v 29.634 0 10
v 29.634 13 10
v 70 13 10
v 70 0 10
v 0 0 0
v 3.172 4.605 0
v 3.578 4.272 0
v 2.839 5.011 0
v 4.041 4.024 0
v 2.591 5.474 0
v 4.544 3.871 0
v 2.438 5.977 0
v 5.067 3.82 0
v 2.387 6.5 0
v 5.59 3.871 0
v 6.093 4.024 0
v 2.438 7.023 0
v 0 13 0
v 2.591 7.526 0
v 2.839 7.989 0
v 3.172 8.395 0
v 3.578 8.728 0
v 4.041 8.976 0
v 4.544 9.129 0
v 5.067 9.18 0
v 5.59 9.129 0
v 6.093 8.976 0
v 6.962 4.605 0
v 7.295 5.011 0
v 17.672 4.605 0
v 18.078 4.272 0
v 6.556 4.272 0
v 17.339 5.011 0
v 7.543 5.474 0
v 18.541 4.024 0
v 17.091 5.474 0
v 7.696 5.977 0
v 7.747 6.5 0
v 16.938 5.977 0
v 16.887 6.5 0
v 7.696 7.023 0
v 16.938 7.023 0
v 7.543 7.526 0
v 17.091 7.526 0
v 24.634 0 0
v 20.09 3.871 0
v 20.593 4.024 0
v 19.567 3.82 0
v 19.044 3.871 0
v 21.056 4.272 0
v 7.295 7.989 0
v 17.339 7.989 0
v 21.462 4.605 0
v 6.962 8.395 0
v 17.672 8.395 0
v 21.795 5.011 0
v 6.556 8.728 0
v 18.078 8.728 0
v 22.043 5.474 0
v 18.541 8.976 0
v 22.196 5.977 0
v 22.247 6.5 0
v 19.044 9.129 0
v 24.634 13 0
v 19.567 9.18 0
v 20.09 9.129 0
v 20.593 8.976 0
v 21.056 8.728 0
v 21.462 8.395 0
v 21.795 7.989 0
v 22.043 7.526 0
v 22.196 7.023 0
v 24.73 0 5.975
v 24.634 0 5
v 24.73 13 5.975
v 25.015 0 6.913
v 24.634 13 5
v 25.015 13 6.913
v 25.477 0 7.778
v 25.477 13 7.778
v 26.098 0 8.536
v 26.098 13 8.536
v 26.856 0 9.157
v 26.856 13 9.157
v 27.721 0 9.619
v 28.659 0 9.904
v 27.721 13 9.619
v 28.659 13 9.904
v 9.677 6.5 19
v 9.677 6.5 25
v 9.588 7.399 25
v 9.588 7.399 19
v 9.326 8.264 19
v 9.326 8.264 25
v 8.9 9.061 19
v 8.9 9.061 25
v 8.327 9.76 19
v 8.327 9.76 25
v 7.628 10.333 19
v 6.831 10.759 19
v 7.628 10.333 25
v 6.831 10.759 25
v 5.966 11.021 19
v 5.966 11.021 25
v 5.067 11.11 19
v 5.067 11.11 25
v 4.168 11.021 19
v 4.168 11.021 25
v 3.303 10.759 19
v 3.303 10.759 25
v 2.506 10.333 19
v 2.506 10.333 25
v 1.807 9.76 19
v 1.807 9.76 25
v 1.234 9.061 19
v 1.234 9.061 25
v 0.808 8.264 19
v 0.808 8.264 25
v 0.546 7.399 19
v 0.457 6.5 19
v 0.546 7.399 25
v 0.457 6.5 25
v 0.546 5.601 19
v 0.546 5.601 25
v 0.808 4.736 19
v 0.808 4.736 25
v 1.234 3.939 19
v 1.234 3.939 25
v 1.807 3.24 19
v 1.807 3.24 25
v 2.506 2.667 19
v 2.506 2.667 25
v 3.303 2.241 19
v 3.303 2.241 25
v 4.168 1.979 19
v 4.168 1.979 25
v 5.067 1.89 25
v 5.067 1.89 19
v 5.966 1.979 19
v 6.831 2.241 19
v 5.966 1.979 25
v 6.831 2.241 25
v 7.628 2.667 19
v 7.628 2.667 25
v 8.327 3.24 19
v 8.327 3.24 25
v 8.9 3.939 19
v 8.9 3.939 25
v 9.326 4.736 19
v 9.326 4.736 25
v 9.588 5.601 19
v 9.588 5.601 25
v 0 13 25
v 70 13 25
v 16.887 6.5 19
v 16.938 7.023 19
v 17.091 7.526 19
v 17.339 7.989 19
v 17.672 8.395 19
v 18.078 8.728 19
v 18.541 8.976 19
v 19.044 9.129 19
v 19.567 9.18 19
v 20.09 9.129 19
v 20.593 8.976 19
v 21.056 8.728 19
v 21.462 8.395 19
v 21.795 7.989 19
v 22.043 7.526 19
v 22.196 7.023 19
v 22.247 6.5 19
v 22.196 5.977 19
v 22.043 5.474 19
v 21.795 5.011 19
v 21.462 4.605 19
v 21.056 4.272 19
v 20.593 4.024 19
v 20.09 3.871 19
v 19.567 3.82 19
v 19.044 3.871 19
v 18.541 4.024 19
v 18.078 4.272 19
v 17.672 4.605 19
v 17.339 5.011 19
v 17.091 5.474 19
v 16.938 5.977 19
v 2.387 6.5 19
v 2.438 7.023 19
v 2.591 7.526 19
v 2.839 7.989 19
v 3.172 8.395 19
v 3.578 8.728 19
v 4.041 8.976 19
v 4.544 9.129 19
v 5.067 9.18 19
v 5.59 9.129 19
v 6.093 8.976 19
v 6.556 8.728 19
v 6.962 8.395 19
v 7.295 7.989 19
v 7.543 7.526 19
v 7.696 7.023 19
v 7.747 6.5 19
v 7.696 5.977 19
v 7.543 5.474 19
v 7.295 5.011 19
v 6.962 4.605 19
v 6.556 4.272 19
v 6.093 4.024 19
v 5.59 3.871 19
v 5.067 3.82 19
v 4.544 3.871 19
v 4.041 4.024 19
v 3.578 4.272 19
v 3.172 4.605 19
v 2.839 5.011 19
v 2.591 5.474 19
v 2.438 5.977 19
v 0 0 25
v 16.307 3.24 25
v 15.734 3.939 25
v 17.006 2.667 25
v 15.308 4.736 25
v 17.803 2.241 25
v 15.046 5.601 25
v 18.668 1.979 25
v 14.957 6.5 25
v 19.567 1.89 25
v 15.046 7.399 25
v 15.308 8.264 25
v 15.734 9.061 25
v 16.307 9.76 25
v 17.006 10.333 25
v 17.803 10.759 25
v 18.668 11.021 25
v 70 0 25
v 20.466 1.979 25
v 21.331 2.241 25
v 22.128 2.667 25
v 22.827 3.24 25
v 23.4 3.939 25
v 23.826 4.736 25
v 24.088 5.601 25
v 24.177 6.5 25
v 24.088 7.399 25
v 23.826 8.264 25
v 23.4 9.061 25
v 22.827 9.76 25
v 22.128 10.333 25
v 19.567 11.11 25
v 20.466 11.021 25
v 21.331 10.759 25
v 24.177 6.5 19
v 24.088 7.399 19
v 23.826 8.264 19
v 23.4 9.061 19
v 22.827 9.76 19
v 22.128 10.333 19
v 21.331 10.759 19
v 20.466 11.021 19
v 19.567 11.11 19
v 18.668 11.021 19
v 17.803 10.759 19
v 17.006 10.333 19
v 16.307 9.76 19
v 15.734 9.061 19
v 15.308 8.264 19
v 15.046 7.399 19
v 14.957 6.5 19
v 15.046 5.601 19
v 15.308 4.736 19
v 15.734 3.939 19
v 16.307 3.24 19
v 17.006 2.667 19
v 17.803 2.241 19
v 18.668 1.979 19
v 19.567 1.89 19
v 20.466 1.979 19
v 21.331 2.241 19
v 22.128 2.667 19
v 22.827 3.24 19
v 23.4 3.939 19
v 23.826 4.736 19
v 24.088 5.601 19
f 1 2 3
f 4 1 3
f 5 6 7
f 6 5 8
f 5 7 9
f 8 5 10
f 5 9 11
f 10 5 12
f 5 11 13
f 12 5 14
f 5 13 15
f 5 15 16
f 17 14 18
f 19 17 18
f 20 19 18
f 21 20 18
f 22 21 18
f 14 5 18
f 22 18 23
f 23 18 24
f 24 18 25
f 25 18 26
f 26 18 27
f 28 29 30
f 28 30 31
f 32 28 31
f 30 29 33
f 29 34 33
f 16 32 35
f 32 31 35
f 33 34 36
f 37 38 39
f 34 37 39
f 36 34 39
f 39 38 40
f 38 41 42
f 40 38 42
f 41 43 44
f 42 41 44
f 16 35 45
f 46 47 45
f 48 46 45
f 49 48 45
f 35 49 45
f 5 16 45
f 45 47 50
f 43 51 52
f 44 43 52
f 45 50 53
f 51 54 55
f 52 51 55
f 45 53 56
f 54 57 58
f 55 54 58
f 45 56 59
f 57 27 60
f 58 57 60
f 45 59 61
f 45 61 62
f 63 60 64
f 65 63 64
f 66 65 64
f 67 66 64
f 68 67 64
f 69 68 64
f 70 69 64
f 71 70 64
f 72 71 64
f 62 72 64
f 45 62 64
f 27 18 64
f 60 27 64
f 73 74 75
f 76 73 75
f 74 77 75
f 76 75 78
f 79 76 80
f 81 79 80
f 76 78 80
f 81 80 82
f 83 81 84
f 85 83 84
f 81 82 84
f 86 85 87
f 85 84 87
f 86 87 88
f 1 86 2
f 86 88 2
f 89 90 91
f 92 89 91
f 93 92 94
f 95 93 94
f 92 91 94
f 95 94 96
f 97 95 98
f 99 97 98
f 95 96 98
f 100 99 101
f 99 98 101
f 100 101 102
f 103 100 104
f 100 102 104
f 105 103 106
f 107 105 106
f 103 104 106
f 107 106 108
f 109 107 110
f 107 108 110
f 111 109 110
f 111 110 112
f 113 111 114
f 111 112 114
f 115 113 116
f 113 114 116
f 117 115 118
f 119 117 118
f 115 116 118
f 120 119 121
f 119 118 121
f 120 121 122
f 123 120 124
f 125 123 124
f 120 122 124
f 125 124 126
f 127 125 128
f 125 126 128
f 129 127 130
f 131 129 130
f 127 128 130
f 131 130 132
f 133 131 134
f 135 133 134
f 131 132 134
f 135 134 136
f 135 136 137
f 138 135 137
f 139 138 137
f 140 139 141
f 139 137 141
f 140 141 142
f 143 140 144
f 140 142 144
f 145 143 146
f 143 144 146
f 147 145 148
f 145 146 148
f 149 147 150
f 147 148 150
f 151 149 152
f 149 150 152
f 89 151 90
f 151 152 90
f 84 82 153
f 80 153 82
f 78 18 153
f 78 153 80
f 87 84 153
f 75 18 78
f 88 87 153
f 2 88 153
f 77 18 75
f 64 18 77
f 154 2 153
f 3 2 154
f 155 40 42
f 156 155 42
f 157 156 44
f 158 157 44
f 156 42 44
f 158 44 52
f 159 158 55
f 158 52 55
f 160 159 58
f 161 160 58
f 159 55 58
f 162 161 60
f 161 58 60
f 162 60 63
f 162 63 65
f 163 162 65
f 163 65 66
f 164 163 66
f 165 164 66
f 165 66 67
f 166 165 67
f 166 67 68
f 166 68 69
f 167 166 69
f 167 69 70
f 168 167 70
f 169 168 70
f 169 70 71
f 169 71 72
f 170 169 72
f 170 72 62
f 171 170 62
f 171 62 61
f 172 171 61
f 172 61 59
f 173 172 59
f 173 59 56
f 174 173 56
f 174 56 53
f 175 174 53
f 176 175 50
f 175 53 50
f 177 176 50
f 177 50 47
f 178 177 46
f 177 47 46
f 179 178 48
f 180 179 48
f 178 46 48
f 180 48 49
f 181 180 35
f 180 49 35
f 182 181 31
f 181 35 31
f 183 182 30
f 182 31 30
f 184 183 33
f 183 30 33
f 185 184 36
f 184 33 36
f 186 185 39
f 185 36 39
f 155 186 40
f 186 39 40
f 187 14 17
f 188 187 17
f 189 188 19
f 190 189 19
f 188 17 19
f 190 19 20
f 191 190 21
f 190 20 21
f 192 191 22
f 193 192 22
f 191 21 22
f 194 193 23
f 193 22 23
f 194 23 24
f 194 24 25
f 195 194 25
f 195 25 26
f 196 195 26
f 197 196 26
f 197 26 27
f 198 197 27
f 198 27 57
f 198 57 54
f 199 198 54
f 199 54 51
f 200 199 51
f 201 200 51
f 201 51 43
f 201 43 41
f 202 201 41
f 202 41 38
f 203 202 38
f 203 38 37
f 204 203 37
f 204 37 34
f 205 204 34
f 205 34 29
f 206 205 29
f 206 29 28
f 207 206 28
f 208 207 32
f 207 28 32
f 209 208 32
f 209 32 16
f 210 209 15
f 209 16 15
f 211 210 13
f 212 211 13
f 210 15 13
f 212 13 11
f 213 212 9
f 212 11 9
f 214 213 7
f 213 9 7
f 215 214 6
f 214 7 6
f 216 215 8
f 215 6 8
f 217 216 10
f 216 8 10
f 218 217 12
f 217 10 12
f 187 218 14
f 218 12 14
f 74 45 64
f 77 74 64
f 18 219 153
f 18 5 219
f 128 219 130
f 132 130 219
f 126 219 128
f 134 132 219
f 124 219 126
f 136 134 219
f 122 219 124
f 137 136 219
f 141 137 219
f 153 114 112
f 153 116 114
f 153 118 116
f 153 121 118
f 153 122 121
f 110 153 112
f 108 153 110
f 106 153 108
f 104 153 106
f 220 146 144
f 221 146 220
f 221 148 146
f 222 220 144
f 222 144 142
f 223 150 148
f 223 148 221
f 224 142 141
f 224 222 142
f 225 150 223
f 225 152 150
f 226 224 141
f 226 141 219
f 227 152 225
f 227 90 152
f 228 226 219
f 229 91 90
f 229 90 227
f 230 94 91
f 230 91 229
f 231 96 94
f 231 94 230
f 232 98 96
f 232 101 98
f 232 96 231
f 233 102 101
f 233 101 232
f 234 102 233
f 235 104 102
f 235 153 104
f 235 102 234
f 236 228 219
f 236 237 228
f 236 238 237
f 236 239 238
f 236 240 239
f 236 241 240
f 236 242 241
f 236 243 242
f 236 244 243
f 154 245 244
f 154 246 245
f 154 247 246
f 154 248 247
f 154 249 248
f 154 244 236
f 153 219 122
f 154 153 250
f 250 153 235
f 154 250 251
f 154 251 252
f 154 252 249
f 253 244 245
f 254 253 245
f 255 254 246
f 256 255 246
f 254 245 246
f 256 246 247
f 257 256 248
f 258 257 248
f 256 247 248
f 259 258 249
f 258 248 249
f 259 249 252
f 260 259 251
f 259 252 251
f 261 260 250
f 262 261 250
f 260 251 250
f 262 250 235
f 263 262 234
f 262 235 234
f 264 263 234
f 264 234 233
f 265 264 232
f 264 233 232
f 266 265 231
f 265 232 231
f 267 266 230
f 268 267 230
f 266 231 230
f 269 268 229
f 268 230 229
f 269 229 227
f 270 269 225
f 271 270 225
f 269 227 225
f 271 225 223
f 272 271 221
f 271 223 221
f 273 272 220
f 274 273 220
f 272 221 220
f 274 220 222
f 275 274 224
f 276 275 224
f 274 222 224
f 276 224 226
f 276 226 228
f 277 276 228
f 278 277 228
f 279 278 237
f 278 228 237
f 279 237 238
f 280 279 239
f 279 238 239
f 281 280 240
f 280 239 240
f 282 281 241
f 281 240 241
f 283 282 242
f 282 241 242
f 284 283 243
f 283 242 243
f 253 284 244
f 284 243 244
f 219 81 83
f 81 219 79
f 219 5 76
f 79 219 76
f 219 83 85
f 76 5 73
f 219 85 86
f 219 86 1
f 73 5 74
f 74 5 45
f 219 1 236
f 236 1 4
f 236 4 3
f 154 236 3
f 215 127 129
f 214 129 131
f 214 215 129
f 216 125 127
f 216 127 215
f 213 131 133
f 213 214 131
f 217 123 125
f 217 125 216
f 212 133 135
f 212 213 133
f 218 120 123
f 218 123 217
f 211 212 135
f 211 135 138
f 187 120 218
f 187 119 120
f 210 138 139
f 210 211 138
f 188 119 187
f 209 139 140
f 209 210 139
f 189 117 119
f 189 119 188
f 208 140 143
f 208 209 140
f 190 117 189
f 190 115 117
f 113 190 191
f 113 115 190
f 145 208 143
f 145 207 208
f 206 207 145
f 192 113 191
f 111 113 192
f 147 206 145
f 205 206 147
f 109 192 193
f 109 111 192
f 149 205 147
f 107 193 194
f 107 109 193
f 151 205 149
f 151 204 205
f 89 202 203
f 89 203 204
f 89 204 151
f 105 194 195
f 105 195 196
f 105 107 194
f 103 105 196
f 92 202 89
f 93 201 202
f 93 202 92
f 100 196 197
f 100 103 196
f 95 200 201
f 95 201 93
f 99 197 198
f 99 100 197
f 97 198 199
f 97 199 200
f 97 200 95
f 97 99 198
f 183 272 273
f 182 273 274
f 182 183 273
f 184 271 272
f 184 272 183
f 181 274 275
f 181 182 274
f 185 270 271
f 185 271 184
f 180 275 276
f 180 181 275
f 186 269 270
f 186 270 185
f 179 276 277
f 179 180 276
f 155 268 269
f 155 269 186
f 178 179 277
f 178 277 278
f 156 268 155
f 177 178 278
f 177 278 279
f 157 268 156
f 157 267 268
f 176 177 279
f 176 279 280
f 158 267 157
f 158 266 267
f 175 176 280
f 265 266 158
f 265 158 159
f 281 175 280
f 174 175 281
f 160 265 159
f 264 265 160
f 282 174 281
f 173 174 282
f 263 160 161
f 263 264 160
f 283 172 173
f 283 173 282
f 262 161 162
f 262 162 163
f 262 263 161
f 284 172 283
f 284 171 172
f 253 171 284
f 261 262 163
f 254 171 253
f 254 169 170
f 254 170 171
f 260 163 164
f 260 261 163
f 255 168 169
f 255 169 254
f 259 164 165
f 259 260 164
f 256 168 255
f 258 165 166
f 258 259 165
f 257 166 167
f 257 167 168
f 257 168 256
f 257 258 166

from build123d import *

# Parameters (mm, degrees)
SKETCH1_W           = 24.634
SKETCH1_H           = 13
BOSS_EXTRUDE1_DEPTH = 10
SKETCH4_W           = 70
SKETCH4_H           = 13
BOSS_EXTRUDE4_DEPTH = 15
FILLET2_R           = 5
SKETCH11_R          = 2.68
CUT_EXTRUDE3_DEPTH  = 26
SKETCH12_R          = 4.61
CUT_EXTRUDE4_DEPTH  = 6


with BuildPart() as part:
    # Sketch1 → Boss-Extrude1 (new body)
    with BuildSketch(Plane.XY):
        with Locations((12.317, 6.5)):
            Rectangle(SKETCH1_W, SKETCH1_H)
    extrude(amount=BOSS_EXTRUDE1_DEPTH)

    # Sketch4 → Boss-Extrude4 (add)
    with BuildSketch(Plane.XY.offset(10)):
        with Locations((35, 6.5)):
            Rectangle(SKETCH4_W, SKETCH4_H)
    extrude(amount=BOSS_EXTRUDE4_DEPTH)

    # Fillet2
    fillet2_edges = [part.edges().sort_by_distance(p)[0] for p in [
        (24.634, 6.5, 10),
    ]]
    fillet(fillet2_edges, radius=FILLET2_R)

    # Sketch11 → Cut-Extrude3 (cut, through all)
    with BuildSketch(Plane(origin=(0, 0, 0), x_dir=(-1, 0, 0), z_dir=(0, 0, -1))):
        with Locations((-5.067, 6.5)):
            Circle(SKETCH11_R)
        with Locations((-19.567, 6.5)):
            Circle(SKETCH11_R)
    extrude(amount=-CUT_EXTRUDE3_DEPTH, mode=Mode.SUBTRACT)

    # Sketch12 → Cut-Extrude4 (cut)
    with BuildSketch(Plane.XY.offset(25)):
        with Locations((5.067, 6.5)):
            Circle(SKETCH12_R)
        with Locations((19.567, 6.5)):
            Circle(SKETCH12_R)
    extrude(amount=-CUT_EXTRUDE4_DEPTH, mode=Mode.SUBTRACT)


solid = part.part
